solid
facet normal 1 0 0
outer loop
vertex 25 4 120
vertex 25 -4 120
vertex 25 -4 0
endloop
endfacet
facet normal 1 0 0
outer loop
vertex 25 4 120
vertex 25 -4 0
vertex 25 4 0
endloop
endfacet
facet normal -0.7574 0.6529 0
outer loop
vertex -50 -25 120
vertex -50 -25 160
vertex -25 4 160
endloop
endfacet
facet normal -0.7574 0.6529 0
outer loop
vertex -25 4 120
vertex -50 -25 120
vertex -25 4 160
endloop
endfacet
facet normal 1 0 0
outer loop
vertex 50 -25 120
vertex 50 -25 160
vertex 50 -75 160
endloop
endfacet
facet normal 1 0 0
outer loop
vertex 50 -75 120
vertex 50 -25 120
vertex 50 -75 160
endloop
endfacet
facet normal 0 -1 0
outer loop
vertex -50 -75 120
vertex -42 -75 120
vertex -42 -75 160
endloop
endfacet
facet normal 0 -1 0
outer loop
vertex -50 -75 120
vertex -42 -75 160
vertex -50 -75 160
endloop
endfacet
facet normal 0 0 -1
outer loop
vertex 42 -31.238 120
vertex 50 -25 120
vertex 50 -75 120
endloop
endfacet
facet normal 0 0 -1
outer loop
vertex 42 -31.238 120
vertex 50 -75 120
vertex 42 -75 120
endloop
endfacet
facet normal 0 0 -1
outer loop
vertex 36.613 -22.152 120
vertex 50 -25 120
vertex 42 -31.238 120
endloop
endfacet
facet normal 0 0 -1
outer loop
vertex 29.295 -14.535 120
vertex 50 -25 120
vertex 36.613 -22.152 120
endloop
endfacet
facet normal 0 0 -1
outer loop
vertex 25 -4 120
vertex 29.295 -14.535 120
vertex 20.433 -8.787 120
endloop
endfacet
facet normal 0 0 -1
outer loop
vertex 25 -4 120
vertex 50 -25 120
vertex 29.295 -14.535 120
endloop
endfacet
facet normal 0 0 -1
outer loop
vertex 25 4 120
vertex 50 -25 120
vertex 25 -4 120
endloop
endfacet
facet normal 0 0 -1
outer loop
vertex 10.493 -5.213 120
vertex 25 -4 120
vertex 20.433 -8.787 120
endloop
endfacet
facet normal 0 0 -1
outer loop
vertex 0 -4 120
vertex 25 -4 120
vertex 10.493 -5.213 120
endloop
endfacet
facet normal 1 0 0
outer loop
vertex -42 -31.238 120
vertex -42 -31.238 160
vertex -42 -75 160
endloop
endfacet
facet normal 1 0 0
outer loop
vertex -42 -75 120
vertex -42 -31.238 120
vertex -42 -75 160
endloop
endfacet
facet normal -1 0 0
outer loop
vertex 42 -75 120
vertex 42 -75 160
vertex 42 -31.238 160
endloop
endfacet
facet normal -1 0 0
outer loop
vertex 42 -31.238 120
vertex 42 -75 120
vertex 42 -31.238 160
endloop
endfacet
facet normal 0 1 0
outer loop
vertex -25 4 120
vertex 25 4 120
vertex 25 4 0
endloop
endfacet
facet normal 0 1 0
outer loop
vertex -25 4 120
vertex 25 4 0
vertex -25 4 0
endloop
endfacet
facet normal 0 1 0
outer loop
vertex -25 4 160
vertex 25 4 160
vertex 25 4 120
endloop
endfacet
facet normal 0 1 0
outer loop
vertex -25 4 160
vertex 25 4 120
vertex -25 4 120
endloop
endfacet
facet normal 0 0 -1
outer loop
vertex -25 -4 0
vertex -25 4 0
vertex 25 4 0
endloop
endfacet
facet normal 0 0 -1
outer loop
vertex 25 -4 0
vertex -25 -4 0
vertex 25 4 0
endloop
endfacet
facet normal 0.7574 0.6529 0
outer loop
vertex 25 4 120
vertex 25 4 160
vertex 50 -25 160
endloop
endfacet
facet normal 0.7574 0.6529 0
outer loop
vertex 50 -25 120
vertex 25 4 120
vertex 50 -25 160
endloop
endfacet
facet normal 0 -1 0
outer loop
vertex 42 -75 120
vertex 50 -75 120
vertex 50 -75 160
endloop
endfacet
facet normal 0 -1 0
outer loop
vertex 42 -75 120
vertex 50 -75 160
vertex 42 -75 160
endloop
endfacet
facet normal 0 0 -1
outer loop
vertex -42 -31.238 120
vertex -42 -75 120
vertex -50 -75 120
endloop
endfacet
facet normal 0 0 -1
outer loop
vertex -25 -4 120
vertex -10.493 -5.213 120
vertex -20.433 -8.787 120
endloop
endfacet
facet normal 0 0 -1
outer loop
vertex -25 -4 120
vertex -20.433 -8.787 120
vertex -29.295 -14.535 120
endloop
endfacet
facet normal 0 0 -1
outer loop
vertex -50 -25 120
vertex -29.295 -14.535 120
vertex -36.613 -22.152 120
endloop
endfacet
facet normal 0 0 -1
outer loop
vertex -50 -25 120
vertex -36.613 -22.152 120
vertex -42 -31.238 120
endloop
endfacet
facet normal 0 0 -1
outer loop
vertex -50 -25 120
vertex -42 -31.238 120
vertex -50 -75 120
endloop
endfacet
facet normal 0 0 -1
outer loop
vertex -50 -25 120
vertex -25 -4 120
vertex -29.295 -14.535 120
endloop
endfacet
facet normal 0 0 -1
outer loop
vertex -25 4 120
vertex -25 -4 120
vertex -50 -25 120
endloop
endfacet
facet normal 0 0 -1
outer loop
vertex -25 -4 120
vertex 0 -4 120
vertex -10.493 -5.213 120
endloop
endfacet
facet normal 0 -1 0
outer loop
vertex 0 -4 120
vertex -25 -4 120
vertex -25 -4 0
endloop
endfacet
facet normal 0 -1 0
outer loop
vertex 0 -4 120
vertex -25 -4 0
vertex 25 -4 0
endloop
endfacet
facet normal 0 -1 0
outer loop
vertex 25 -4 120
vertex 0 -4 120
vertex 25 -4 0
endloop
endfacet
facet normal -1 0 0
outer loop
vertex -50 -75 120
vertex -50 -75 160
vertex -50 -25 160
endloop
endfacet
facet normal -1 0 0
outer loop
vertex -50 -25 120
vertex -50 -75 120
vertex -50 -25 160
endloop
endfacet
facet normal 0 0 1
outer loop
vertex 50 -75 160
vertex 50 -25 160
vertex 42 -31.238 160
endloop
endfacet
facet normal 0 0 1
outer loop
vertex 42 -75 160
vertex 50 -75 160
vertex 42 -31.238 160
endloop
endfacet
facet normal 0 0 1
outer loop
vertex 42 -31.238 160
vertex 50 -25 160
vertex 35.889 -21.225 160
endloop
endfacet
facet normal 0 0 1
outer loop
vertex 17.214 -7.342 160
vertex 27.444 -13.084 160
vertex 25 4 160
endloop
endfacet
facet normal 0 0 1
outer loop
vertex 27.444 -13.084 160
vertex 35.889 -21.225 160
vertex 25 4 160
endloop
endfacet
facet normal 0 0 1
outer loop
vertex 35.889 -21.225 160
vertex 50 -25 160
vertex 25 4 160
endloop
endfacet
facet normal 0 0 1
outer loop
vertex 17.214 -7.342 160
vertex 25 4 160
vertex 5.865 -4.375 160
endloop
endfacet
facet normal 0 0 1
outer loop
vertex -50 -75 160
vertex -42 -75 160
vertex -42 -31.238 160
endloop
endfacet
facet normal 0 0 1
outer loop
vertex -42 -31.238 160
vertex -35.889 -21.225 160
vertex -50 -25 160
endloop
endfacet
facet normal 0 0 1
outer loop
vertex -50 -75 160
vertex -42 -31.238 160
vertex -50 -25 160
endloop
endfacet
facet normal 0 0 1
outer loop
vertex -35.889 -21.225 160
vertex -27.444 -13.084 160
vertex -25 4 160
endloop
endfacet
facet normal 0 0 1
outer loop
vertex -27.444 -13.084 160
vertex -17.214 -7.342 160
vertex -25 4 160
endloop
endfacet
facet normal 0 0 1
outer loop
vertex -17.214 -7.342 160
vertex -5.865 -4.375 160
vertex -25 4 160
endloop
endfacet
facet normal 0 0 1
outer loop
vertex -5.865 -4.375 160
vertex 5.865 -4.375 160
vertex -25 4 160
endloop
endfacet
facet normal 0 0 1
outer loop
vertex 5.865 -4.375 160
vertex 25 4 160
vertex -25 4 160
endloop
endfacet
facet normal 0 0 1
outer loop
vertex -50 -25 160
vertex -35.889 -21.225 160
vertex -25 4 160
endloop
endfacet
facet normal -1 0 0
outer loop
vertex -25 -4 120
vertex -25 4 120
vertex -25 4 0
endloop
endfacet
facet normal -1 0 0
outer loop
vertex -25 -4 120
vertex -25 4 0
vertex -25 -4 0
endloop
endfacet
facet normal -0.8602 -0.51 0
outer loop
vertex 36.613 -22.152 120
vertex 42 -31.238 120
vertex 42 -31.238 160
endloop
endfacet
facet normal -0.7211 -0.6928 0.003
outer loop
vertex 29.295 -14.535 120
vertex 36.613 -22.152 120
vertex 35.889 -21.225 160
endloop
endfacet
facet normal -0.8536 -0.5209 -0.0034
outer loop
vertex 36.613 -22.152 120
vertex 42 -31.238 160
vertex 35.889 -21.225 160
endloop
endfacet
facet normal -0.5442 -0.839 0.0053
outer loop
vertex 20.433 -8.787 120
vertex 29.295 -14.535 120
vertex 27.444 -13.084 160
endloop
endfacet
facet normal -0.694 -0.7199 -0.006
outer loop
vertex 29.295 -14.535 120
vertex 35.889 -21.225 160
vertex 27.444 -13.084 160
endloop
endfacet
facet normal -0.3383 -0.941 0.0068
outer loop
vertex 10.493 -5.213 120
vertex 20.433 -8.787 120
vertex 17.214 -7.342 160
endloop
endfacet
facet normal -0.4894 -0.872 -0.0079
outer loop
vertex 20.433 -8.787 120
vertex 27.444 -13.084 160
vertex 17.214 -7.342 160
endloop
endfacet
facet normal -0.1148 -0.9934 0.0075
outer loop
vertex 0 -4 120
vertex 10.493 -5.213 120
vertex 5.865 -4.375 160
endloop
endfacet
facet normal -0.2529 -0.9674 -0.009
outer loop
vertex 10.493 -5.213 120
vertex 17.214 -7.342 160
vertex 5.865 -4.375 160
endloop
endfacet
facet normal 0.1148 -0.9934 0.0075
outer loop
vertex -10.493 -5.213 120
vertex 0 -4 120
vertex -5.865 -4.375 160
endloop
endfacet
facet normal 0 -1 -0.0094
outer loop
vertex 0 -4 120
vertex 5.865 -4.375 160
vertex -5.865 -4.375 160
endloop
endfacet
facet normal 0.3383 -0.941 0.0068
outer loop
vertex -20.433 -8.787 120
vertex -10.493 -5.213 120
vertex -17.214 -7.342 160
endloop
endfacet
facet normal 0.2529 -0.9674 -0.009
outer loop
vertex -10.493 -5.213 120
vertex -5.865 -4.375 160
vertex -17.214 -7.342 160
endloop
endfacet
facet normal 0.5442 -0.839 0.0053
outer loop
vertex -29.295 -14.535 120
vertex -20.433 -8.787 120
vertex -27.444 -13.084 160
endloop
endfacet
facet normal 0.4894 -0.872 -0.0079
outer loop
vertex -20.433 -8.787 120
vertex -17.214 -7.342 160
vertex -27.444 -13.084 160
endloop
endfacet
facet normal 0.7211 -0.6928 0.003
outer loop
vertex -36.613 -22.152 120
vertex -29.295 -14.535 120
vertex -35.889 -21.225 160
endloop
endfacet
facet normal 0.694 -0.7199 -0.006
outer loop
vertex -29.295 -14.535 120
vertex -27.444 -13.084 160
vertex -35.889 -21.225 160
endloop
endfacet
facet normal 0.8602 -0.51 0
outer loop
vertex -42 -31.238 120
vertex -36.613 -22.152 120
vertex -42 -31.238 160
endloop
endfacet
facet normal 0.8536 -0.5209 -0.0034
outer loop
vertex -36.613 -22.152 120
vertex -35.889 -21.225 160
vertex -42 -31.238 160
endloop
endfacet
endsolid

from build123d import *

# Parameters (mm, degrees)
SKETCH_1_W      = 50
SKETCH_1_H      = 8
EXTRUDE_1_DEPTH = 40


with BuildPart() as part:
    # 扫描1: sweep along a path in 草图2
    with BuildLine(Plane(origin=(0, 0, 0), x_dir=(0, 0, -1), z_dir=(1, 0, 0))) as sweep_1_path:
        Line((0, 55.298323556), (-160, 55.298323556))
    # 草图1 → 扫描1 (sweep)
    with BuildSketch(Plane.XY):
        Rectangle(SKETCH_1_W, SKETCH_1_H)
    sweep(path=sweep_1_path.line)

    # 草图4 → 凸台-拉伸1 (add)
    with BuildSketch(Plane.XY.offset(160)):
        with BuildLine():
            Line((-50, -25), (-25, 4))
            Line((-25, 4), (25, 4))
            Line((25, 4), (50, -25))
            Line((50, -25), (50, -75))
            Line((50, -75), (42, -75))
            Line((42, -75), (42, -31.238336961))
            ThreePointArc((42, -31.238336961), (0, -4), (-42, -31.238336961))
            Line((-42, -31.238336961), (-42, -75))
            Line((-42, -75), (-50, -75))
            Line((-50, -75), (-50, -25))
        make_face()
    extrude(amount=-EXTRUDE_1_DEPTH)


solid = part.part
